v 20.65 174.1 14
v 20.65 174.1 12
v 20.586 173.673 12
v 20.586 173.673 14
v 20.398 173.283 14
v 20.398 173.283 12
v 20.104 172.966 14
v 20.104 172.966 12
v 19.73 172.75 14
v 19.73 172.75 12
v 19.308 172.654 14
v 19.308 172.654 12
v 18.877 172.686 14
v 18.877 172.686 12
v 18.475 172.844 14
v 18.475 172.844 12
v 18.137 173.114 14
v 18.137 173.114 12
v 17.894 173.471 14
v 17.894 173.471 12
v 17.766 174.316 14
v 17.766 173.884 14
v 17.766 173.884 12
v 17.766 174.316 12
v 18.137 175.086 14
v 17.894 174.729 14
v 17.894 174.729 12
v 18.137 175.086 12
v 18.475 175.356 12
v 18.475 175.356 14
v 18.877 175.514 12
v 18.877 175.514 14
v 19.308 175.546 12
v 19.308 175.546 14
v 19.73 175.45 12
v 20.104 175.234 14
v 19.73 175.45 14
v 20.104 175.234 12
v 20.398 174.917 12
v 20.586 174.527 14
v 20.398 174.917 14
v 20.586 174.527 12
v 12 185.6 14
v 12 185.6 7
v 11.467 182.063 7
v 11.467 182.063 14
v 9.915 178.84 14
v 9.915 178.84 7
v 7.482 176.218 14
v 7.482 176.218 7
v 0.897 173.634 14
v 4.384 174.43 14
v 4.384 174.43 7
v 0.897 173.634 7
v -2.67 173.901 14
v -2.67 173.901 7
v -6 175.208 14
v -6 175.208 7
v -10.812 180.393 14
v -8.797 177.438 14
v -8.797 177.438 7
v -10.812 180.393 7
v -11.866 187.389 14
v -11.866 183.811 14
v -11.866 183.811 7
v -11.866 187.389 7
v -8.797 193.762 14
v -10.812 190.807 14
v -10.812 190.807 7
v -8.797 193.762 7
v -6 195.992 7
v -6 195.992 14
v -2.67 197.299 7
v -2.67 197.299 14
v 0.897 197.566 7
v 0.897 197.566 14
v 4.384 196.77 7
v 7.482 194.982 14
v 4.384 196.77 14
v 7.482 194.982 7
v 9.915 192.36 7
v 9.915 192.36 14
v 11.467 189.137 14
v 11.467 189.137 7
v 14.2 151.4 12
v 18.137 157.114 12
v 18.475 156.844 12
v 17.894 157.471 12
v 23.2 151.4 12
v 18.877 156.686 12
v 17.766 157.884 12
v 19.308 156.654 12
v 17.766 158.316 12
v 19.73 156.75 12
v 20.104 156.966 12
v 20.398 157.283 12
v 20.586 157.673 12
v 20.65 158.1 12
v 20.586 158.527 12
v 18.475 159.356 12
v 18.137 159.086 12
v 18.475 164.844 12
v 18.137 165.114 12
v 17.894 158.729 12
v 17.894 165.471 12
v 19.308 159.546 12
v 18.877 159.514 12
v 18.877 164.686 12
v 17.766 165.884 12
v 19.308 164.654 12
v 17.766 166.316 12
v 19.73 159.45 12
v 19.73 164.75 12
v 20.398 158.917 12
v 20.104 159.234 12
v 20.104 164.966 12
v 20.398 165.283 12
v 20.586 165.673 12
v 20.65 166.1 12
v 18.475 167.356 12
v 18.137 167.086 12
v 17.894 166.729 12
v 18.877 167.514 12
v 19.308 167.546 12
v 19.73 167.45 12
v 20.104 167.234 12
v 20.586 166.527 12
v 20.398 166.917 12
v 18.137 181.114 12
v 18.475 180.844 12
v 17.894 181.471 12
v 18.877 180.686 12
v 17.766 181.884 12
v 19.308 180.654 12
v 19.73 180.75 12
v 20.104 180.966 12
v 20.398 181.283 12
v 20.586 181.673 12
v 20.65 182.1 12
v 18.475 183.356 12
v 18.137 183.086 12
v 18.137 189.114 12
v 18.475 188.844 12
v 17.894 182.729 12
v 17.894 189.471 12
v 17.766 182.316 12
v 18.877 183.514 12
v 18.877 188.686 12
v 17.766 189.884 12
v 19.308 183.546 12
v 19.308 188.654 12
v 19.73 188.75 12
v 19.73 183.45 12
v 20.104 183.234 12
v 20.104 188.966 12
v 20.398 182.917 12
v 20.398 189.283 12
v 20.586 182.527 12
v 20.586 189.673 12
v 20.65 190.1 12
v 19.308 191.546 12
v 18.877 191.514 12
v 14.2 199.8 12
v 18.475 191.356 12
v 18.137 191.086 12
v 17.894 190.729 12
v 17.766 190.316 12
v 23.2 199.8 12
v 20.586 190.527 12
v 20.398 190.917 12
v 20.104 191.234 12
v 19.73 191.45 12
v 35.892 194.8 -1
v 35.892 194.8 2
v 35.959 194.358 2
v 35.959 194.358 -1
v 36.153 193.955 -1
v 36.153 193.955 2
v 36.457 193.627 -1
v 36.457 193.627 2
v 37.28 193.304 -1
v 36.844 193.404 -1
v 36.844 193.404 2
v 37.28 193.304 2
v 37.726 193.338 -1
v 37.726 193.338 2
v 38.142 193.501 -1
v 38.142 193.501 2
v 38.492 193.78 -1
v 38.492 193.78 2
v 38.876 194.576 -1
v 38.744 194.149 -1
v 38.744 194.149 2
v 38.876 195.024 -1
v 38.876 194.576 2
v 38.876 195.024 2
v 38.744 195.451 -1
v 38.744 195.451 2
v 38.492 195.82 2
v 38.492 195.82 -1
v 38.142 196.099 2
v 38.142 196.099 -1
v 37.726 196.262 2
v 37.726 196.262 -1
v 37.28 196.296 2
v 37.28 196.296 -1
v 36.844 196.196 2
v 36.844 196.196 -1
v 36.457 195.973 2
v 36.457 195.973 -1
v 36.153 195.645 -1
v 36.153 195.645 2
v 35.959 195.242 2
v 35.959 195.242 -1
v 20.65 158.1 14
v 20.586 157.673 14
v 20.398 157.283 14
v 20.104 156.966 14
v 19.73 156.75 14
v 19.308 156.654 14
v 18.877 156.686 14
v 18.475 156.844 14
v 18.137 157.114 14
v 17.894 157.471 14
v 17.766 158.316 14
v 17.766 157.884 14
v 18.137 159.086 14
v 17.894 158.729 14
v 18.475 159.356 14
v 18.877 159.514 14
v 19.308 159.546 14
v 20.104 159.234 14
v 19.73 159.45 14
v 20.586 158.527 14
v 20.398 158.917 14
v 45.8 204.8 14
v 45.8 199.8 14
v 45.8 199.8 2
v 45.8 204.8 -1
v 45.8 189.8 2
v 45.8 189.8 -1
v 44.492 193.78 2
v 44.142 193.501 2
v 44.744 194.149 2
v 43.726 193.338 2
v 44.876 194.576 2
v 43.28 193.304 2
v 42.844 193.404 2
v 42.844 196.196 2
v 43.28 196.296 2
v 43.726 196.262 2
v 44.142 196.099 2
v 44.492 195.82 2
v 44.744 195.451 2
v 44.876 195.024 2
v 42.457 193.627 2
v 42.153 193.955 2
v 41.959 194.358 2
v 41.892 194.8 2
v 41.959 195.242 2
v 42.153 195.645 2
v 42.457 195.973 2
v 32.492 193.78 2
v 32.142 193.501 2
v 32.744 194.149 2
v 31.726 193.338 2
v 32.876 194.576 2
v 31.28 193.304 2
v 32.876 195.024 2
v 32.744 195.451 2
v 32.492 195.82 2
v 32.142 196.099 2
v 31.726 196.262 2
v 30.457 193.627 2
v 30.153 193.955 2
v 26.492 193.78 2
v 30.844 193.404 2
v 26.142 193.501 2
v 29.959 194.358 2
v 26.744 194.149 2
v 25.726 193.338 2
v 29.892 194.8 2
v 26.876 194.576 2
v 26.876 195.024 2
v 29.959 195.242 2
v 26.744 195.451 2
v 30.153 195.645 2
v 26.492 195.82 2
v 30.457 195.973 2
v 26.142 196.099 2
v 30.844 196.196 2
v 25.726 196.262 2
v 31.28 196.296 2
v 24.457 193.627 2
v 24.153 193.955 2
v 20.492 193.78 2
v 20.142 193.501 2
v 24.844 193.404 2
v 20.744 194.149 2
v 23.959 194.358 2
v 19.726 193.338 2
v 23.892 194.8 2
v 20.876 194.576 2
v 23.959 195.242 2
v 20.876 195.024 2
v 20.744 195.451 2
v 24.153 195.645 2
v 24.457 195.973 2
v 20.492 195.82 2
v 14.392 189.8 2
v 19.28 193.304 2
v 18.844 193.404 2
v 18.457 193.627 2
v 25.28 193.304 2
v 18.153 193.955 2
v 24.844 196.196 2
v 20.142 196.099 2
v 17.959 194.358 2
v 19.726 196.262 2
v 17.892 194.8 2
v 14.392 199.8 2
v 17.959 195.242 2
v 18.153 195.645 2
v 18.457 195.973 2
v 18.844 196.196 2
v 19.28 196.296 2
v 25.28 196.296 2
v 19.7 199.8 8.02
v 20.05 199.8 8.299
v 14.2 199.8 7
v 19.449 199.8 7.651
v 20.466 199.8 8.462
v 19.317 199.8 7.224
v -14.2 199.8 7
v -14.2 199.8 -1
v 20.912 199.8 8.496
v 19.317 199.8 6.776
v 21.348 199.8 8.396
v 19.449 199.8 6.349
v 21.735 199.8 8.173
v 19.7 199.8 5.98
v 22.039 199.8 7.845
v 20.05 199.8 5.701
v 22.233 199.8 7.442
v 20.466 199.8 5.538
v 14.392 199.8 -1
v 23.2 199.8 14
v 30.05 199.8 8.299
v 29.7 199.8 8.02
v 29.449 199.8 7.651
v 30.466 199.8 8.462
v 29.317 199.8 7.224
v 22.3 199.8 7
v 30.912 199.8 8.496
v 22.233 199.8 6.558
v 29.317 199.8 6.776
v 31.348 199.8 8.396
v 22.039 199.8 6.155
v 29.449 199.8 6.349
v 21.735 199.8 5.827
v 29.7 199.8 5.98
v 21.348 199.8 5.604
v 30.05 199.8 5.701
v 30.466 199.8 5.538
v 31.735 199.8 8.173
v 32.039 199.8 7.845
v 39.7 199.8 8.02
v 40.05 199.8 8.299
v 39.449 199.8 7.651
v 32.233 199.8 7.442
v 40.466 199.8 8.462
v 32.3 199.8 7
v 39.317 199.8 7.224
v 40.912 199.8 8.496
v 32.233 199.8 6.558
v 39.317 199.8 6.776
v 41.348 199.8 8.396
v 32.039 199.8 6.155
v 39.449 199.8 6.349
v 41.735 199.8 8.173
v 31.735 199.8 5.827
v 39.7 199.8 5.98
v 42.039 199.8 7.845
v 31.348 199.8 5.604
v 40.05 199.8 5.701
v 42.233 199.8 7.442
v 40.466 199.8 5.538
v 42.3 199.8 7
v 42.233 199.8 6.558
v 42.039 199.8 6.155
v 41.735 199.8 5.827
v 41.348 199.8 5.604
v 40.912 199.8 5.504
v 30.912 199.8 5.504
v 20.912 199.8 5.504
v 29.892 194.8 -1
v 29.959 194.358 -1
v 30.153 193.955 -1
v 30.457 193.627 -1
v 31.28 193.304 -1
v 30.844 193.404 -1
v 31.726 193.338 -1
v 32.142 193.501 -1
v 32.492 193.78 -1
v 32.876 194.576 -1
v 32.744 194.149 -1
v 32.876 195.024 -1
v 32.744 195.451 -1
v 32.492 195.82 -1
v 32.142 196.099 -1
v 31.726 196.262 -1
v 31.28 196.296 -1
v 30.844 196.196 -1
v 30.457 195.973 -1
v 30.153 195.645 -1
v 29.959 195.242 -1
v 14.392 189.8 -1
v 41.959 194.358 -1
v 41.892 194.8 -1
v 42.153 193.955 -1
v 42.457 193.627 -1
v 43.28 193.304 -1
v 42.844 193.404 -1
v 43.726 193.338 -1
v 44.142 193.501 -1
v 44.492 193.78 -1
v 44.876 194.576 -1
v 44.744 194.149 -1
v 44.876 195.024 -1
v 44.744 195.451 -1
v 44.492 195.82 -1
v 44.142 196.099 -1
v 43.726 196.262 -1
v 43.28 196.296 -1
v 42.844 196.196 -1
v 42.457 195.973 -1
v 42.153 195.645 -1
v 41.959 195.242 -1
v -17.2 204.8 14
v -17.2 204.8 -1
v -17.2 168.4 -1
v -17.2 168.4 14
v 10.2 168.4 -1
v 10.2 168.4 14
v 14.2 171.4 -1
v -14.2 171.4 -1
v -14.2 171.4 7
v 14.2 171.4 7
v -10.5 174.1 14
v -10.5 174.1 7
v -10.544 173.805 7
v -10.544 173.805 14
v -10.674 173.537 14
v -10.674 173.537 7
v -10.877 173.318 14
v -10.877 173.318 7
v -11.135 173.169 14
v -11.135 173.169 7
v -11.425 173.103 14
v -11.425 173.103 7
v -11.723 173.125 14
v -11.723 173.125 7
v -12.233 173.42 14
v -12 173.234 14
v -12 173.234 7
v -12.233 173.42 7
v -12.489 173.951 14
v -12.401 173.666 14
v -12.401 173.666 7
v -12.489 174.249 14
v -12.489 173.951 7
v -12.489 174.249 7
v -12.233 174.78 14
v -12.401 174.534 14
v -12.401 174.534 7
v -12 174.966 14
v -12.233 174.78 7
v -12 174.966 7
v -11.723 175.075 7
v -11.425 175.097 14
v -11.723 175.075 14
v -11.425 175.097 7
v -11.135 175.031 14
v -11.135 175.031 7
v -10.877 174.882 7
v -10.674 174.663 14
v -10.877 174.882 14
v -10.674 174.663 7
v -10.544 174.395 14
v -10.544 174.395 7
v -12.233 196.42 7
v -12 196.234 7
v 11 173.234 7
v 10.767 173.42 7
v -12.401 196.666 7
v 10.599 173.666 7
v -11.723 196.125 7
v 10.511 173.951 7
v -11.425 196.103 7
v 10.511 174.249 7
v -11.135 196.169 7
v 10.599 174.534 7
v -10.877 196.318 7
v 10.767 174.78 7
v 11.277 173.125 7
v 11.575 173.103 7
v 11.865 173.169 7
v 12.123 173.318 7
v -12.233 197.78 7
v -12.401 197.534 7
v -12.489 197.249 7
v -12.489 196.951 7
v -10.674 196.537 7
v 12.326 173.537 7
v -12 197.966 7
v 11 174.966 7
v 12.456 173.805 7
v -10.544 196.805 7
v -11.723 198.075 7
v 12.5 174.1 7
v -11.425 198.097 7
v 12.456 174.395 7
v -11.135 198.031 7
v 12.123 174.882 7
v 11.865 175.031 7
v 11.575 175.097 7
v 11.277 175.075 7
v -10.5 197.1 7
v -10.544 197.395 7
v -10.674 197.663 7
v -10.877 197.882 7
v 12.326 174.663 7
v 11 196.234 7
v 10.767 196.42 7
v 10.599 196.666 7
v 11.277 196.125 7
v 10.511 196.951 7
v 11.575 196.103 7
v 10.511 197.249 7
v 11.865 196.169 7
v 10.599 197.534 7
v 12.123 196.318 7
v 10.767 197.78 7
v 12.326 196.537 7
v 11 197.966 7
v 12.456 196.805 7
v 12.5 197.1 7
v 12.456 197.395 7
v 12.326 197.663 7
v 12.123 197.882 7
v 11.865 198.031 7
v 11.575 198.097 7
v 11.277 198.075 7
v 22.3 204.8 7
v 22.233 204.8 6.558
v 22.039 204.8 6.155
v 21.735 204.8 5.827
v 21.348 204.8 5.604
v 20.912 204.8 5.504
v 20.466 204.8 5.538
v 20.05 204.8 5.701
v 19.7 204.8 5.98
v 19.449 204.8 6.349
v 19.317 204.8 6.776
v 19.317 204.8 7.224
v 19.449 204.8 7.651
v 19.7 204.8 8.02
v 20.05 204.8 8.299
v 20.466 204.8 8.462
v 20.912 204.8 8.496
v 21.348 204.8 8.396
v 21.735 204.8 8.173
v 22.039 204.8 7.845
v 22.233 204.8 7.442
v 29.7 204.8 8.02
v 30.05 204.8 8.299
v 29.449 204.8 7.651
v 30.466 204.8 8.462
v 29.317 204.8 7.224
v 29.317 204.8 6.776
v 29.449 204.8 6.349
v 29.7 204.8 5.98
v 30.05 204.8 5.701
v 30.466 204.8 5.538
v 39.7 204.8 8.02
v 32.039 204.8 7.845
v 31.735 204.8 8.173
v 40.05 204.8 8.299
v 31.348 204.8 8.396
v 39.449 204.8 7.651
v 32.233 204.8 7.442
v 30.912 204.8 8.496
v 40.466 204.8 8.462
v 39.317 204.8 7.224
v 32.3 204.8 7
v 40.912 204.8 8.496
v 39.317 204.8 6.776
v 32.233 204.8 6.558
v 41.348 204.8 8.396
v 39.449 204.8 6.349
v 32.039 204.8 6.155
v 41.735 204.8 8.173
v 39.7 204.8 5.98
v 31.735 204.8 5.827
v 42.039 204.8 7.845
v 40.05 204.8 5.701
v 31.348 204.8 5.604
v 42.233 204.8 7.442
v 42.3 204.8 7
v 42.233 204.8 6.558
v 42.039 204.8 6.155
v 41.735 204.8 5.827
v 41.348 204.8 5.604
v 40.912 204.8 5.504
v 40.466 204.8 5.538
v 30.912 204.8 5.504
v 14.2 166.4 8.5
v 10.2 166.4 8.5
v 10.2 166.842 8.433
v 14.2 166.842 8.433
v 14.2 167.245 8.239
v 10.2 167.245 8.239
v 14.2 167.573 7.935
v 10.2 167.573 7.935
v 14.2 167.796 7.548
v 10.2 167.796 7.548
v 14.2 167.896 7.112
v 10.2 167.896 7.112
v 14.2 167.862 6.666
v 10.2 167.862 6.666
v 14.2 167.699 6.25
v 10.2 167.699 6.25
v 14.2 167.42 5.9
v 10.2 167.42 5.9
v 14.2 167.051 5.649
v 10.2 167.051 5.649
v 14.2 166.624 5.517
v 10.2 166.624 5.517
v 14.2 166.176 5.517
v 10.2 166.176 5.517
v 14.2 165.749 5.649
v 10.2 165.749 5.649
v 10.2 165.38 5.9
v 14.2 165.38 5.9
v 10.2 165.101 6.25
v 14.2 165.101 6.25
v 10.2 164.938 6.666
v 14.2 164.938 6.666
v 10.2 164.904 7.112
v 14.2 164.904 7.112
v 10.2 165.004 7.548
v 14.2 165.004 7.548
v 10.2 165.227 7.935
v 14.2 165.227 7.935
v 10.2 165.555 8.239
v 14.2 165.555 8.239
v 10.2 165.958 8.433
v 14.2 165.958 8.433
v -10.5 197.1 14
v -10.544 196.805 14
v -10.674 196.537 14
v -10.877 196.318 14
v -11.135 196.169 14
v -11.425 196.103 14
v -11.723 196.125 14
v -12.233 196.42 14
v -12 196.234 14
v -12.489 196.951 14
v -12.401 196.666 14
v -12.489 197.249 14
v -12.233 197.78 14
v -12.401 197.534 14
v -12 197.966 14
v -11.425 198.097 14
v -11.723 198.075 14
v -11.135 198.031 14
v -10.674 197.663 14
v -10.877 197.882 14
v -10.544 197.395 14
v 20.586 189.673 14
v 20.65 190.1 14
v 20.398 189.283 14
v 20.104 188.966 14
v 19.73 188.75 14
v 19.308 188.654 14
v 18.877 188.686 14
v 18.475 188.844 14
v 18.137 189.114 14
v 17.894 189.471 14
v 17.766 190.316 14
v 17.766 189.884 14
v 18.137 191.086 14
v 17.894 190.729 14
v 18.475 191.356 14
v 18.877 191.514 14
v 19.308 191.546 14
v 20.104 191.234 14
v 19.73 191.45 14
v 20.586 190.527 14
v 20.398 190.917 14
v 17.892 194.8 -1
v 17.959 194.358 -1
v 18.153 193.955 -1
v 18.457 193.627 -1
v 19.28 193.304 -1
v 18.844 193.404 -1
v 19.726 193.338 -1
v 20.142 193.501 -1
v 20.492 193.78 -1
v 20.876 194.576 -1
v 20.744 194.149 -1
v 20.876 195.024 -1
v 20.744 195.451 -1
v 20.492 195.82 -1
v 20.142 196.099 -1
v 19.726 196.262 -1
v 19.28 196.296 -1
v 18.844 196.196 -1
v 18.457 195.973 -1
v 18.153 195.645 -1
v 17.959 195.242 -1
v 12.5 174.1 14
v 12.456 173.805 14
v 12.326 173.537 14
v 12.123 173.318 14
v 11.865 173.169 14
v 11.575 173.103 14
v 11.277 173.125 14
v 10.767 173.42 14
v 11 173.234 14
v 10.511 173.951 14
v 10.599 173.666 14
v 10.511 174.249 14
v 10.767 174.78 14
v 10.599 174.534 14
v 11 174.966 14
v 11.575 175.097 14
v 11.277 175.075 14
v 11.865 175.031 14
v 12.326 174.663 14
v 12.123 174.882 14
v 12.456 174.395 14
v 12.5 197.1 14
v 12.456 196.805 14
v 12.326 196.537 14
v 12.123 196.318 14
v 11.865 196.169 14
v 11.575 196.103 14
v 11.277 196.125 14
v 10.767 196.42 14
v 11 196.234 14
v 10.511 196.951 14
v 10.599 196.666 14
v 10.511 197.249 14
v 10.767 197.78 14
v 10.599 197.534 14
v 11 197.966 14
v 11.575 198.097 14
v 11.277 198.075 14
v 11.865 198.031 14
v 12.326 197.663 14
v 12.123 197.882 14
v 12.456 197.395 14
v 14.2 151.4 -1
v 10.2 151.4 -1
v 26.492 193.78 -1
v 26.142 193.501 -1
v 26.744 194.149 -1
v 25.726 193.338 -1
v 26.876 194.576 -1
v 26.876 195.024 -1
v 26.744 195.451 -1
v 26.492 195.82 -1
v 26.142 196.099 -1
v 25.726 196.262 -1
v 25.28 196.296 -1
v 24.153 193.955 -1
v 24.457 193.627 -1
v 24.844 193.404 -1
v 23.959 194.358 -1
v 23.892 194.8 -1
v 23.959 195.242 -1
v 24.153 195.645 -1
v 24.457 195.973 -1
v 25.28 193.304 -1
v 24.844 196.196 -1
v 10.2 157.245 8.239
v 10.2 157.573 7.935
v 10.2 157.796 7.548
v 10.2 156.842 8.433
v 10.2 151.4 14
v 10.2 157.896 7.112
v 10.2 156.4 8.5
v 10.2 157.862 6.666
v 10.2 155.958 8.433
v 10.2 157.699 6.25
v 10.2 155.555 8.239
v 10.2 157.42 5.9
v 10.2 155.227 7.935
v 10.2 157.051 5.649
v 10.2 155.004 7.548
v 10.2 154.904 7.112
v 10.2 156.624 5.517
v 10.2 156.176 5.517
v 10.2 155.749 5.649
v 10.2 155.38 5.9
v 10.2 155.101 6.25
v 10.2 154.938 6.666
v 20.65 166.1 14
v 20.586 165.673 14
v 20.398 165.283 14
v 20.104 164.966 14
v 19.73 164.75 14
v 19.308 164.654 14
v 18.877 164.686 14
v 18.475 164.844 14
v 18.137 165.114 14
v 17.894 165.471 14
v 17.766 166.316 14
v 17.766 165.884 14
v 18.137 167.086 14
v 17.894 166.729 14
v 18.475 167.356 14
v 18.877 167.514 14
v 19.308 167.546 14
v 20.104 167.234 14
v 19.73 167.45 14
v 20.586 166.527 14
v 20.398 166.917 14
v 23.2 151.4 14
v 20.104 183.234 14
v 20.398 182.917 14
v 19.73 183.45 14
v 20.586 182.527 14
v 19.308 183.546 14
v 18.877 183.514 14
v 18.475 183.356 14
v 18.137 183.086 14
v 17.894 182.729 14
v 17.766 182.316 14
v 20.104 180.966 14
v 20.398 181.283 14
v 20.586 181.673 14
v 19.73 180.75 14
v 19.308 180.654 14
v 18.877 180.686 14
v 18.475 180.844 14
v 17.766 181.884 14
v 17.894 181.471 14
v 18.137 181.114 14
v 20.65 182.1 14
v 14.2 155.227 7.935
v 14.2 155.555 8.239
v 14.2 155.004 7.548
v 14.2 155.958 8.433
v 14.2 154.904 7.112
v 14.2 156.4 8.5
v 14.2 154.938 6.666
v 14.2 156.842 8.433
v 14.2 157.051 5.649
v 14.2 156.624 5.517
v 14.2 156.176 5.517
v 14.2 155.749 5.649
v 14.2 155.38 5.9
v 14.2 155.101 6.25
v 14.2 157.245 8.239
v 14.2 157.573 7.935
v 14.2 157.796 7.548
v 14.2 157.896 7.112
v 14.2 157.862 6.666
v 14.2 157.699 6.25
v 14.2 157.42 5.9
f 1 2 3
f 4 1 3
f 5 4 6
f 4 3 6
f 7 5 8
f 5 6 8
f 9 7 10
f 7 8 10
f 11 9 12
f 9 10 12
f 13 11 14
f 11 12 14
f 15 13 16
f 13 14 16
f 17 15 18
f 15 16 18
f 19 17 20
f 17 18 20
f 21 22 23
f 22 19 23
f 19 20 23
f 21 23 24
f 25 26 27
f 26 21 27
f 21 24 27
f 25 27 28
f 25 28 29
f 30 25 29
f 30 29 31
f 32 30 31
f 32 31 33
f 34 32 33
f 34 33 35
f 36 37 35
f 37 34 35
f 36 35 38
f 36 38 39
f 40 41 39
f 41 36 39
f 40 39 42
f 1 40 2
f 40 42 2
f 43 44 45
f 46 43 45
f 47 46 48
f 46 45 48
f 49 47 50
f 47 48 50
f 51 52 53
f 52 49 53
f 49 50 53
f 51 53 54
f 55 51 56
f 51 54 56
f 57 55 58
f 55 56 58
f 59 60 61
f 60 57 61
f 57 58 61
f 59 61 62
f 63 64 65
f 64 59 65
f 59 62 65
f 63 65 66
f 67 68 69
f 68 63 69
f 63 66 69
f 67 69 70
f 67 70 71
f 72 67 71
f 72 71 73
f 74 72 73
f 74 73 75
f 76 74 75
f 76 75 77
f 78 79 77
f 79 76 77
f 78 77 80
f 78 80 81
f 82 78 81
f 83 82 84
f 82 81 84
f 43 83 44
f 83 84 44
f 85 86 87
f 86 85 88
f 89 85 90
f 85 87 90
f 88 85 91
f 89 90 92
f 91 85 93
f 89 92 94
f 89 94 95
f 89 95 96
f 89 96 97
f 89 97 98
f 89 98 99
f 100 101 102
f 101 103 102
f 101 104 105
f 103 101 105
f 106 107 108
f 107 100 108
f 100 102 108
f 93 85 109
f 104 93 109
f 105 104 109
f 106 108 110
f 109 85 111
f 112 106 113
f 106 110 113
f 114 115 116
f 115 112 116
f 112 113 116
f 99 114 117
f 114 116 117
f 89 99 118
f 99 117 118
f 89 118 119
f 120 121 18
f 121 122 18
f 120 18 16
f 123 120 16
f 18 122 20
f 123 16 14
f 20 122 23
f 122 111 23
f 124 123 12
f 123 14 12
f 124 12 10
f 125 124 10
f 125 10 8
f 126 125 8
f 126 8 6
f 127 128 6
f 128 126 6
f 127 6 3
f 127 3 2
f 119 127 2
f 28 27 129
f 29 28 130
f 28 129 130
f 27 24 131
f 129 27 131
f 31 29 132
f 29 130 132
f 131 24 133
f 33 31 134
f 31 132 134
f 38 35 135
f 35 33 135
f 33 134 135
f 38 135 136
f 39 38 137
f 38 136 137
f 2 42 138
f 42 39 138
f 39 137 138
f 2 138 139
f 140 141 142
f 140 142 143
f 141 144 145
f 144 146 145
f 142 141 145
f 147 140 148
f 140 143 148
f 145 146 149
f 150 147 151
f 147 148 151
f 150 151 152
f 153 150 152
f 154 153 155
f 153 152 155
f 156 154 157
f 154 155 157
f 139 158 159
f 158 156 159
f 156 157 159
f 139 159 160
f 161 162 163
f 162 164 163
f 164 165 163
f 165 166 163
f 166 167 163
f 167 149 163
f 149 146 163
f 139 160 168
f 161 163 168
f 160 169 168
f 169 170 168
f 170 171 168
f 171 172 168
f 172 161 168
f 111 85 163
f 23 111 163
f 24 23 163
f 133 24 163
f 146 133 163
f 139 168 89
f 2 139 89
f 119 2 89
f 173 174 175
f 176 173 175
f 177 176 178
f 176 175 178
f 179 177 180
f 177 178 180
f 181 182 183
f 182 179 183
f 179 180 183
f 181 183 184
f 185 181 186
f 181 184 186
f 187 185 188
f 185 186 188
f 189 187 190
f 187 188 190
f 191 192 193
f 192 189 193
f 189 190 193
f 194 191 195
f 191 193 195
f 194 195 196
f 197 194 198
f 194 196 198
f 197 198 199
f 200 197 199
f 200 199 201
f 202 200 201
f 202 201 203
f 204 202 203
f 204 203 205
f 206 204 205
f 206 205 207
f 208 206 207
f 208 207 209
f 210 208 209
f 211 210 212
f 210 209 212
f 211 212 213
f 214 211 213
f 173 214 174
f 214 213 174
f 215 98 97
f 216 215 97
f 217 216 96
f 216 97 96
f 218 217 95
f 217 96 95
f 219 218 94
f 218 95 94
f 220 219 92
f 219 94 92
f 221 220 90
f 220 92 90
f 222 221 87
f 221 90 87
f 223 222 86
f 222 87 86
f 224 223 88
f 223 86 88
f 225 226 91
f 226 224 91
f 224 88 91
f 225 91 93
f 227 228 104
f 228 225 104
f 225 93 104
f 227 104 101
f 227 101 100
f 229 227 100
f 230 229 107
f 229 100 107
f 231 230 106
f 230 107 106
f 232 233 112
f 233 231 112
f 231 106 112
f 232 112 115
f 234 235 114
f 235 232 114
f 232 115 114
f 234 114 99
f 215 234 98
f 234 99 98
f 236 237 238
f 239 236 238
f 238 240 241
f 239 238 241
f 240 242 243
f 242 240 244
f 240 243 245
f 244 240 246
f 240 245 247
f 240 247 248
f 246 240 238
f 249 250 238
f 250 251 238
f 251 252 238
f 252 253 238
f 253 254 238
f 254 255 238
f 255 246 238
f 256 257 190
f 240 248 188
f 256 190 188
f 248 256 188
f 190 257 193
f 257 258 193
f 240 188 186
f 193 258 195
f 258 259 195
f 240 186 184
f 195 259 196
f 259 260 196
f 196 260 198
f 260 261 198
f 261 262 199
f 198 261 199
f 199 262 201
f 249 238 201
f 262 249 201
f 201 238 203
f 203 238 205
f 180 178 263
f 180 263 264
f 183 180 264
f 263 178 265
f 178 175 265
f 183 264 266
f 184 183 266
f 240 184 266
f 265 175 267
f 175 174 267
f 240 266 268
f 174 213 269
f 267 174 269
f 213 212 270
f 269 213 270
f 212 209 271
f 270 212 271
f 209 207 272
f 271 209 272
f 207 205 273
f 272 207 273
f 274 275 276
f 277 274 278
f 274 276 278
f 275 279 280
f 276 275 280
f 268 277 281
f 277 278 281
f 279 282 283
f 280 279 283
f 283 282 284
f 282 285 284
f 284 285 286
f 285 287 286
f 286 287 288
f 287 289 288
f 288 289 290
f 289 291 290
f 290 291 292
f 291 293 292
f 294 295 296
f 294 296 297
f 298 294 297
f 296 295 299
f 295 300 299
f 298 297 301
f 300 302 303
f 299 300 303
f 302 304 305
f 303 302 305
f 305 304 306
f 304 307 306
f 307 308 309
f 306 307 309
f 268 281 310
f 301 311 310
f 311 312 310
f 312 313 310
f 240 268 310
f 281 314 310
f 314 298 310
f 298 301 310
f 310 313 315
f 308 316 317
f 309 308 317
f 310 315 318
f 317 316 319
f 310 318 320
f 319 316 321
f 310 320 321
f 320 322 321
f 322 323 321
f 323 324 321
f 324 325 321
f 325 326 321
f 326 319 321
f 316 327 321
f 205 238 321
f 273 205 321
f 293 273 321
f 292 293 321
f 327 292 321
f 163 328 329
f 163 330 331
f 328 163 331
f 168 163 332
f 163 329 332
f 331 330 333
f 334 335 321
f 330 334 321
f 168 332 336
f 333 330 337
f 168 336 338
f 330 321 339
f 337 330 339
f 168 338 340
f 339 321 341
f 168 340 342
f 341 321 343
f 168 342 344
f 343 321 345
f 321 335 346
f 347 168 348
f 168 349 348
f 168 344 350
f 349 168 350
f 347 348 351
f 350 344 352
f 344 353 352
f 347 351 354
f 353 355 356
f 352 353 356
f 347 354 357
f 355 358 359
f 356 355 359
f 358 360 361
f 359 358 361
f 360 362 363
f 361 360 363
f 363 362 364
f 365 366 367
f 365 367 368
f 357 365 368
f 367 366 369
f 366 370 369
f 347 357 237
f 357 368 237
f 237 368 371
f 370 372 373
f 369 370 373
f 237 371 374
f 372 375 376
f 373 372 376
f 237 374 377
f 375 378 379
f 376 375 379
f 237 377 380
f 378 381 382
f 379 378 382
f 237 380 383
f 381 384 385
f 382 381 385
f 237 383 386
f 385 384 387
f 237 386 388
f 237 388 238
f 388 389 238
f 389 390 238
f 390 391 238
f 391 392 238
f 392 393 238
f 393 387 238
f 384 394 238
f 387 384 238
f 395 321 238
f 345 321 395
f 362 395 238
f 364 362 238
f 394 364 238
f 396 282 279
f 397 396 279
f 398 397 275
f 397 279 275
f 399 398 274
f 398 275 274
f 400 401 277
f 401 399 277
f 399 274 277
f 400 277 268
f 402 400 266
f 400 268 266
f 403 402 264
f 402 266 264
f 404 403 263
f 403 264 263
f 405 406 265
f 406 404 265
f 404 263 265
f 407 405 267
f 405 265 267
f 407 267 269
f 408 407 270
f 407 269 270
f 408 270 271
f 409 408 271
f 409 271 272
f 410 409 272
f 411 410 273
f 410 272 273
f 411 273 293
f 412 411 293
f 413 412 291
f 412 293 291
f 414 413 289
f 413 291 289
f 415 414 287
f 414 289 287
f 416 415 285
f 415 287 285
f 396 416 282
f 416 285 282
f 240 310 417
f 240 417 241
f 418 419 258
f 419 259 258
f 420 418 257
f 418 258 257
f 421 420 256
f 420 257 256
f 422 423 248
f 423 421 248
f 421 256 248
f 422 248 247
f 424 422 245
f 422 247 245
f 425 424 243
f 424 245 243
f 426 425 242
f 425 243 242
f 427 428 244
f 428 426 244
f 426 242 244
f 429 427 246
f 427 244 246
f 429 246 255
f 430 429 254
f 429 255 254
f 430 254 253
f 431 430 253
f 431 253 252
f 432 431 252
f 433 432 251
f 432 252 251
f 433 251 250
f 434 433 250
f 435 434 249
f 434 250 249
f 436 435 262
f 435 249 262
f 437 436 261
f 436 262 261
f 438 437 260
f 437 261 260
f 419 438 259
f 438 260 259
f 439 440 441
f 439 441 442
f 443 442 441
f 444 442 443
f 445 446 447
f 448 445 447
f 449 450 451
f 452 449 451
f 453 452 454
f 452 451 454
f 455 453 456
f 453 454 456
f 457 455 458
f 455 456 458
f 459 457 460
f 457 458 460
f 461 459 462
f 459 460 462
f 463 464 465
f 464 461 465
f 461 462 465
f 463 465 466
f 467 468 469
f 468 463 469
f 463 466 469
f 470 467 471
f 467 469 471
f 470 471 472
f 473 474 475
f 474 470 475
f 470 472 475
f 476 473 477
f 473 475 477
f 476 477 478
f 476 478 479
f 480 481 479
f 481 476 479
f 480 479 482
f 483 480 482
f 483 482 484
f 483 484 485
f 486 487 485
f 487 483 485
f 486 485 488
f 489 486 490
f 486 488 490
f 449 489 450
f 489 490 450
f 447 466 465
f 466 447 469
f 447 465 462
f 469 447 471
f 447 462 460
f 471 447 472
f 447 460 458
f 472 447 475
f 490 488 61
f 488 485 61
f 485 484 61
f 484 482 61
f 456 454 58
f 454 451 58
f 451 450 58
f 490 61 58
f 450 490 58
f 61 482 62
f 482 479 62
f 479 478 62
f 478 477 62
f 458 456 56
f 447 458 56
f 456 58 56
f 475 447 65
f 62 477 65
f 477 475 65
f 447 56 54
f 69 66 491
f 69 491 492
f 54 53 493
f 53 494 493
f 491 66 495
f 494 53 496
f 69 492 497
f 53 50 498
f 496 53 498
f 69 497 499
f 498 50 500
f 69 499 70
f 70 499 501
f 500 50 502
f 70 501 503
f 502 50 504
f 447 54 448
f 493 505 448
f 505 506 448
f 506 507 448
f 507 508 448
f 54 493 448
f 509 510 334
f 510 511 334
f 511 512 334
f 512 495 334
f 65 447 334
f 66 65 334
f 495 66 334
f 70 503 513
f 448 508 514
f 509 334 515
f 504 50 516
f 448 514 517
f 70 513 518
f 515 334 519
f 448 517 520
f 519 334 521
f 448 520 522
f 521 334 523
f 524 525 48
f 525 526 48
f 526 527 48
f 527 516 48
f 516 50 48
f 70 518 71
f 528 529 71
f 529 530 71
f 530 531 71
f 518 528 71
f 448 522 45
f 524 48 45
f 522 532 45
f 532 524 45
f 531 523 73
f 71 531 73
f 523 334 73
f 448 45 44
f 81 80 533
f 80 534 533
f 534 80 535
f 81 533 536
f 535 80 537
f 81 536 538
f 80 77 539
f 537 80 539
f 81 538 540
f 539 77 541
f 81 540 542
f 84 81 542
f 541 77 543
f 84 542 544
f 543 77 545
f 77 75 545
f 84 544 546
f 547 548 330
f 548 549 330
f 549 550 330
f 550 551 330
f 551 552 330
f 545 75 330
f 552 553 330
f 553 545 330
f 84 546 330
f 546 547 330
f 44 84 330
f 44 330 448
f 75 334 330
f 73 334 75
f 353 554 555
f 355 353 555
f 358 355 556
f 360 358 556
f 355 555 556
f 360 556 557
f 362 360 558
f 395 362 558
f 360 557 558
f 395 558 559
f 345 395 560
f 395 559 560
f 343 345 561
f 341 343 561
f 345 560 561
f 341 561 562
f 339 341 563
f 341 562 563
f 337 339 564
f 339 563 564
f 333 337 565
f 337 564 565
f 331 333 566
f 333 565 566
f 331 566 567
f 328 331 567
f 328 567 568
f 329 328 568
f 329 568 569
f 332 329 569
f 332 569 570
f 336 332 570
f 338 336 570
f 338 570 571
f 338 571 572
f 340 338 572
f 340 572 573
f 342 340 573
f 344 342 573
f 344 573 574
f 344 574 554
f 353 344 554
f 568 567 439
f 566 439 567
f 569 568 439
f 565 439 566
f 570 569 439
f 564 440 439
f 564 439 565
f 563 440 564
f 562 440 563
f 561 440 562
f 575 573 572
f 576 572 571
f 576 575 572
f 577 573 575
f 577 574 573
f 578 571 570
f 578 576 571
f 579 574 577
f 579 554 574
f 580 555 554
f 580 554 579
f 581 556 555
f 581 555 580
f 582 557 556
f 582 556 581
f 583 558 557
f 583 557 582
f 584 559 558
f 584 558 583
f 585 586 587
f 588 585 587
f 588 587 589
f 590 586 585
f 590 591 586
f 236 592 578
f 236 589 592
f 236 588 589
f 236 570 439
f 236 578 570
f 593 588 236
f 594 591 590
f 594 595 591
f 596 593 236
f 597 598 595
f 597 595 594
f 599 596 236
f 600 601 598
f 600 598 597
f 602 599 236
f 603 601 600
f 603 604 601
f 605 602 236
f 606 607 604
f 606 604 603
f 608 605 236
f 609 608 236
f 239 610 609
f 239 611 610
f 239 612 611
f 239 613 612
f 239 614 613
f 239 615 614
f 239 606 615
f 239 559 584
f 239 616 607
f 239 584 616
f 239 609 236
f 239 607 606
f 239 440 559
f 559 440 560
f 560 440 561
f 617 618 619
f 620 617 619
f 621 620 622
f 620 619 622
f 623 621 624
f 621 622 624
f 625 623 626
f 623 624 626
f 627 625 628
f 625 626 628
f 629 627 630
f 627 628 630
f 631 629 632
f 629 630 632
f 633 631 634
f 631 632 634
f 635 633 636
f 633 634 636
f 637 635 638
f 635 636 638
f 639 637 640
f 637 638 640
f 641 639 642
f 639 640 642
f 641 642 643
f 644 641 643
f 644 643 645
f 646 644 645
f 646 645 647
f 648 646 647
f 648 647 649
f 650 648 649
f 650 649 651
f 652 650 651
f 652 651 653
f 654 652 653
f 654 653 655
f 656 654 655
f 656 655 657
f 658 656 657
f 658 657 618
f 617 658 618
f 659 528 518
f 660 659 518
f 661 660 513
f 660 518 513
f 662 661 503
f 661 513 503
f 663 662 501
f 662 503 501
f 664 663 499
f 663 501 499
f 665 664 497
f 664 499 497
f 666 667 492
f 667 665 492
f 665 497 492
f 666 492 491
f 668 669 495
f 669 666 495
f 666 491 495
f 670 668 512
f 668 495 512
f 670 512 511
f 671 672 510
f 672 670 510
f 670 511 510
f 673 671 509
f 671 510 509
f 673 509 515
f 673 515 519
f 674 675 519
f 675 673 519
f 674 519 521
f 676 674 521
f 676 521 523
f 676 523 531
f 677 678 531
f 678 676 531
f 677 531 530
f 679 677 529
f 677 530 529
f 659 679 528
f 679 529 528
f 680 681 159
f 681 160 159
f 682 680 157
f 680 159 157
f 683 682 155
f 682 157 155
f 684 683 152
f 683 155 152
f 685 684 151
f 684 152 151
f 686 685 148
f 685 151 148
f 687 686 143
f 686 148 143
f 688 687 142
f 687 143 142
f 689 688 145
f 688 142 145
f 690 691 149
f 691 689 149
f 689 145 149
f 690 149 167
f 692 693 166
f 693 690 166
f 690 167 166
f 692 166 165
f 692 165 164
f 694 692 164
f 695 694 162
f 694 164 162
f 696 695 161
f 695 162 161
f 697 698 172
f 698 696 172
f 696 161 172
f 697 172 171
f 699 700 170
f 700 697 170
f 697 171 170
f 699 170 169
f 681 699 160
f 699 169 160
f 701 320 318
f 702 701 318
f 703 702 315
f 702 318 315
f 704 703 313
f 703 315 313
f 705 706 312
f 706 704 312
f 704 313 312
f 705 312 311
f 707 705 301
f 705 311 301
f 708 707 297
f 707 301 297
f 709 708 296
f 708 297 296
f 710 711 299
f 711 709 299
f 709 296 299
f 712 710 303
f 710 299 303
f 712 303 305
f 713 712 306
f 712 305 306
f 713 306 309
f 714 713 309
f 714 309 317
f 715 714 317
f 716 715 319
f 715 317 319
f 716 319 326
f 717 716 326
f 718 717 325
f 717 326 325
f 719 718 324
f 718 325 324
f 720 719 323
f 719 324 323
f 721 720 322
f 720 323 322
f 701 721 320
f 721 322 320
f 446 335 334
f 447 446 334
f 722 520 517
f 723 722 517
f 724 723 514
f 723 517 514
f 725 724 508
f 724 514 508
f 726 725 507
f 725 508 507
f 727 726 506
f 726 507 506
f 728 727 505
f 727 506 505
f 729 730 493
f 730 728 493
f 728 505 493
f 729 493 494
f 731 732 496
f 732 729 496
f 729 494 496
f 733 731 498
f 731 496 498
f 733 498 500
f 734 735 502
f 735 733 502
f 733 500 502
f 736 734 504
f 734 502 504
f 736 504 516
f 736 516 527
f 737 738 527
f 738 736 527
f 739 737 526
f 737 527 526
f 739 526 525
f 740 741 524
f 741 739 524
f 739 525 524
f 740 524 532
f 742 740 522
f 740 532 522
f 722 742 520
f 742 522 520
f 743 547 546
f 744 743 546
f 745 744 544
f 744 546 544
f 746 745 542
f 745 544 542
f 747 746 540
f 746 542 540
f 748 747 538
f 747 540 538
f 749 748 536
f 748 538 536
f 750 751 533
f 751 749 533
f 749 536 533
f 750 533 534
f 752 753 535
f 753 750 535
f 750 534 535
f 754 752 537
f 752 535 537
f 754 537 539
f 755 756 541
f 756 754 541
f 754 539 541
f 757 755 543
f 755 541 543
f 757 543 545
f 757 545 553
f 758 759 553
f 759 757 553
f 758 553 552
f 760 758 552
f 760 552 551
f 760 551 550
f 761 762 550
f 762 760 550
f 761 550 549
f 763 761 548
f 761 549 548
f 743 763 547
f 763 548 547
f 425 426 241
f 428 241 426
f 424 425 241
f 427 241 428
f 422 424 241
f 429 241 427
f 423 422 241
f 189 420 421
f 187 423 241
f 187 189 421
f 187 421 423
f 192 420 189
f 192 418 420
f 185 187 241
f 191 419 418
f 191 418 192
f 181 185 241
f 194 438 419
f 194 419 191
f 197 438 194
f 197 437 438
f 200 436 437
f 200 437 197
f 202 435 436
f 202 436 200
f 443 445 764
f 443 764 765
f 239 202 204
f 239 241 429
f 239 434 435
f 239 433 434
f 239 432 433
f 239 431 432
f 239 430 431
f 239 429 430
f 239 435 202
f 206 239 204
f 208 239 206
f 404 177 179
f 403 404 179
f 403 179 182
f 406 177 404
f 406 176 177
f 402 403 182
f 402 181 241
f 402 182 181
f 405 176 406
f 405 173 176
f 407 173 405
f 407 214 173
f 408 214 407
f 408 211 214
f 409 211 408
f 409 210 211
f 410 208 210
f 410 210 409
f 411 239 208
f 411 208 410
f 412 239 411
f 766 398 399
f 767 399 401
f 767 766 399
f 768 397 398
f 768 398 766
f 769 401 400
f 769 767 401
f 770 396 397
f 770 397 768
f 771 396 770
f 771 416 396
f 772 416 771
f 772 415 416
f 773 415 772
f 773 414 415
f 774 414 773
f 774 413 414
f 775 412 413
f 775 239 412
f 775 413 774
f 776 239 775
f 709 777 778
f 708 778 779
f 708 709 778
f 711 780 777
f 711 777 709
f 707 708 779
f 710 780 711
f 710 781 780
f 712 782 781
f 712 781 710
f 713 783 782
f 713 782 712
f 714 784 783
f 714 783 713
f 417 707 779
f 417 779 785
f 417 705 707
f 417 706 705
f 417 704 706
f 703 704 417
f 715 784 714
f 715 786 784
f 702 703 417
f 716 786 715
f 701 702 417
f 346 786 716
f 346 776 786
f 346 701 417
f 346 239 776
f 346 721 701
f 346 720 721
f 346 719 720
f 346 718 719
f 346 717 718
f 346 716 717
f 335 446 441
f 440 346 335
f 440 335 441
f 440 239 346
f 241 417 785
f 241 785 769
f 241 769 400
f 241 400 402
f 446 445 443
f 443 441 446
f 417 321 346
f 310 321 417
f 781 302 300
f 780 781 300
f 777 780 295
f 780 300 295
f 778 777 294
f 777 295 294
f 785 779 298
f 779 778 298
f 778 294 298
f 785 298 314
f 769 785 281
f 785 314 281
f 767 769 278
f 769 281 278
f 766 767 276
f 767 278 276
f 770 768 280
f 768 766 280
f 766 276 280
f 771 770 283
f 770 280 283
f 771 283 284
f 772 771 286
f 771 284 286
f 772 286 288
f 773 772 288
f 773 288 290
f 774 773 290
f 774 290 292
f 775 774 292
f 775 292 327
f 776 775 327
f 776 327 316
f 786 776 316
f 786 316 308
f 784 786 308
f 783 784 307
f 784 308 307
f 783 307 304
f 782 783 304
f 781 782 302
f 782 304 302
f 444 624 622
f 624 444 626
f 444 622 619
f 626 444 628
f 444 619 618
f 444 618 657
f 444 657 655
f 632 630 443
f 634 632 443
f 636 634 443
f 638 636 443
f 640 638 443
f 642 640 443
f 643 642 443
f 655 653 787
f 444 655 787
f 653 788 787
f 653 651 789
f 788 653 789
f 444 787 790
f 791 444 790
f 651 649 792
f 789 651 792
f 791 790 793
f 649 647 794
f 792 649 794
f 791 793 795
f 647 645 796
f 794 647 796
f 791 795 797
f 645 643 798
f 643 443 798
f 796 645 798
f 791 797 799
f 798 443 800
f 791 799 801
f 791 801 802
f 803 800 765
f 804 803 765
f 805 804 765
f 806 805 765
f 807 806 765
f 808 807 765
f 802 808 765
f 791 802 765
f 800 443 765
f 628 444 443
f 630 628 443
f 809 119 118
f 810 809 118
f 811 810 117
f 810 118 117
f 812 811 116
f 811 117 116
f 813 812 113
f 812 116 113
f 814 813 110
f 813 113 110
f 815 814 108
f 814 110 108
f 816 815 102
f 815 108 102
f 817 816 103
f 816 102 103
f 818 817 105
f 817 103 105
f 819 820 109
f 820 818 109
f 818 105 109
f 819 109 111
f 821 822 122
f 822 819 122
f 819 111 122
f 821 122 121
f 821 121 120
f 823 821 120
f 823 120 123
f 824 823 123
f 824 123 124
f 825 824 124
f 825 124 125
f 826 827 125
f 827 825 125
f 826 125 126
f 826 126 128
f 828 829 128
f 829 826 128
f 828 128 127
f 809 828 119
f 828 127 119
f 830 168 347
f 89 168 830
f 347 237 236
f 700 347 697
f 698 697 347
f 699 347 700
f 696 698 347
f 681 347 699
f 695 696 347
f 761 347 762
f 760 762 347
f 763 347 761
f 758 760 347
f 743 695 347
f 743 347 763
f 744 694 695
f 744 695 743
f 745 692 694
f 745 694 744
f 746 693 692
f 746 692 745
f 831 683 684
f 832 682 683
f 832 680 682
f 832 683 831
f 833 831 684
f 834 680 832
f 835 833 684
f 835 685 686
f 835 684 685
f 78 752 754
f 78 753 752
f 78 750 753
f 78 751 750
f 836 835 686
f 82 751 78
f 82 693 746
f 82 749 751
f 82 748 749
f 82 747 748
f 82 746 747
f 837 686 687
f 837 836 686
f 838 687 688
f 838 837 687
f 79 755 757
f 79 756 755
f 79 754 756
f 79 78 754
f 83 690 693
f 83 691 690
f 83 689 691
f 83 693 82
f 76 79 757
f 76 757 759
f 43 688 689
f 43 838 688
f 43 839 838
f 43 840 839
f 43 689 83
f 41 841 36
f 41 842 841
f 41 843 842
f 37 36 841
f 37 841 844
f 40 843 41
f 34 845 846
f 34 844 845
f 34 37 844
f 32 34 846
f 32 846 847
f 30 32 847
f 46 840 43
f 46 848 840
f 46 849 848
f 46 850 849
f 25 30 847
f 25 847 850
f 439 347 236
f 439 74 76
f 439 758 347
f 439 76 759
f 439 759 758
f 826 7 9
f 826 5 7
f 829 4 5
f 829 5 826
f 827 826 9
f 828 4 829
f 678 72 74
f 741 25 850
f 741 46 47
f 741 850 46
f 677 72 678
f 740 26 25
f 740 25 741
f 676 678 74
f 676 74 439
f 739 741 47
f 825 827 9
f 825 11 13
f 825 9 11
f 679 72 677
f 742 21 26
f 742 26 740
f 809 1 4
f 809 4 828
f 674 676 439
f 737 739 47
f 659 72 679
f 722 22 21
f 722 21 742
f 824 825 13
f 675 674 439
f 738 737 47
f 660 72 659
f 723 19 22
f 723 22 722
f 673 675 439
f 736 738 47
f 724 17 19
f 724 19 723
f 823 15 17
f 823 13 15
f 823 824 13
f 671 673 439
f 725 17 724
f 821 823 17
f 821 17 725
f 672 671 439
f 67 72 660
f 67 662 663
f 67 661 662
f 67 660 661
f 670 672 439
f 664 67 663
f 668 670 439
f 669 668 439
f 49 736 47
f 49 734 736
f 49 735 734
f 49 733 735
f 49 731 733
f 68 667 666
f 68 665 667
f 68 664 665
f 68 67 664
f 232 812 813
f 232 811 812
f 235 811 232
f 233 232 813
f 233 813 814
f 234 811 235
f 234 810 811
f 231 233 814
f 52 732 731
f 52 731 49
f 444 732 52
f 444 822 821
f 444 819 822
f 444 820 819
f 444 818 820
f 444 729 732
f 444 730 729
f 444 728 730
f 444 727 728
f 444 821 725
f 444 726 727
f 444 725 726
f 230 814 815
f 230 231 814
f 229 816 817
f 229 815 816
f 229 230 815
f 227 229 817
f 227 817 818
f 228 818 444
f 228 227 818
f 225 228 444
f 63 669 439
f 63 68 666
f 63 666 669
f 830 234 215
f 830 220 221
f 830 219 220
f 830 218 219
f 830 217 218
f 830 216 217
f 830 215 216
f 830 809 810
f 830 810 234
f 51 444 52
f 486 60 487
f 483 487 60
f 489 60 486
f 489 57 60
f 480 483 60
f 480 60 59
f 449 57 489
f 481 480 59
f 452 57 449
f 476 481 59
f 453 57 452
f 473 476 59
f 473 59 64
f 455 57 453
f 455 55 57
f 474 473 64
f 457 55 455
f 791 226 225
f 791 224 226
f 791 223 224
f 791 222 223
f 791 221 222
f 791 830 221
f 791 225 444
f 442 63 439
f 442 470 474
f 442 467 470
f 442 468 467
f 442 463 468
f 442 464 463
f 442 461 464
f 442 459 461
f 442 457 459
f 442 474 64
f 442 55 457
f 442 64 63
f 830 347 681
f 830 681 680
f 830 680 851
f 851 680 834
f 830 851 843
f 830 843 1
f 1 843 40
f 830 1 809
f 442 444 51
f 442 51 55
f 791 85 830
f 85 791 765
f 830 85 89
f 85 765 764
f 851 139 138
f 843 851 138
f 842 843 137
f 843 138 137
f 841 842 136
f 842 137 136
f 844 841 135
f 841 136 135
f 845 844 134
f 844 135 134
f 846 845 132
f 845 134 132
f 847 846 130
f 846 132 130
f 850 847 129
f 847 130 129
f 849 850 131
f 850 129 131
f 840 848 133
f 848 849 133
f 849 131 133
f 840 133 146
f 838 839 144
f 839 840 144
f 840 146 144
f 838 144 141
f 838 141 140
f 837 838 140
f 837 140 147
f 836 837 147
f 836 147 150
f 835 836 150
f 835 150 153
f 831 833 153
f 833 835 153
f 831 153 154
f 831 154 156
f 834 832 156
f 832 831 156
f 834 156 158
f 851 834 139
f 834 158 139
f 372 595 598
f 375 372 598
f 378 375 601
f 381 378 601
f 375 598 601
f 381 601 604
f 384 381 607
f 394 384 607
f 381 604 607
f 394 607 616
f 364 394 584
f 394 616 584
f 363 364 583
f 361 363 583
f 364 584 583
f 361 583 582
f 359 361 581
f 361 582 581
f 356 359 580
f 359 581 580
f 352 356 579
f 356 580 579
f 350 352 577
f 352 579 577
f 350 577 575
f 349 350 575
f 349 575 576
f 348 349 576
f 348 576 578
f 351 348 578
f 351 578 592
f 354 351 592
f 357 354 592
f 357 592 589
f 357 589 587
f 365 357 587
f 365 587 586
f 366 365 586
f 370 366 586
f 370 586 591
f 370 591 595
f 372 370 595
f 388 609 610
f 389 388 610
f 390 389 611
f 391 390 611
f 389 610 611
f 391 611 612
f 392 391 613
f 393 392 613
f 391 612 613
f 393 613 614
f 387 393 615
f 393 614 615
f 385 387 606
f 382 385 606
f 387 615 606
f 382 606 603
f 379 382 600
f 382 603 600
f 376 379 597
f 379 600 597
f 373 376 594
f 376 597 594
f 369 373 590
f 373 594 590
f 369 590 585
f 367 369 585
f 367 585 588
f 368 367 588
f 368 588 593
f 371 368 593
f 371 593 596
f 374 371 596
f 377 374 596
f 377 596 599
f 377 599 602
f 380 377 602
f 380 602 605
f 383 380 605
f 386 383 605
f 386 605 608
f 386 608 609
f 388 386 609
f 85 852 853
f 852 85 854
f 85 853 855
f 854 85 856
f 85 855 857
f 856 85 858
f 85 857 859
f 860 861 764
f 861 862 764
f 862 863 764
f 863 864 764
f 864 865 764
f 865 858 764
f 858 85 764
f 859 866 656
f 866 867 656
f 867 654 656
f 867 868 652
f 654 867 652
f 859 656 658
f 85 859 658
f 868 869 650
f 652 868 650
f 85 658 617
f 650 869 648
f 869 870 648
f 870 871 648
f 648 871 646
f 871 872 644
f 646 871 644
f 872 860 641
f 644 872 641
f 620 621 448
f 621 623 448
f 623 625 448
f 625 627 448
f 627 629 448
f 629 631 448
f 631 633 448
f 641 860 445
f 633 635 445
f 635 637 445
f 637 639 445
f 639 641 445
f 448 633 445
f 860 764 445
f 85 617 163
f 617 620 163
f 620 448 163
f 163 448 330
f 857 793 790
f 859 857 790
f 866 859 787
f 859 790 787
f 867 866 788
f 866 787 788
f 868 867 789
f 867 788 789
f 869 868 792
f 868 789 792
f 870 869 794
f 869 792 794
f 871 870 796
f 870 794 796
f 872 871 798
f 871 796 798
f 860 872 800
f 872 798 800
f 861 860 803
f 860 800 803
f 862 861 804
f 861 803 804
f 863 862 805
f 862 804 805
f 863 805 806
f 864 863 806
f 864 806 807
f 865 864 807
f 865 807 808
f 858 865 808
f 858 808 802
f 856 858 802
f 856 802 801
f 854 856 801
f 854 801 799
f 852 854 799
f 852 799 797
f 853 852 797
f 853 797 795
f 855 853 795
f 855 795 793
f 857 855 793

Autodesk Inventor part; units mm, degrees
ref_plane "YZ Plane" through (0, 0, 0) normal (1, 0, 0) x (0, 1, 0)
ref_plane "Work Plane1" through (0, 185.6, 7) normal (0, 0, 1) x (1, 0, 0)
sketch "Sketch1" plane through (0, 185.6, 7) normal (0, 0, 1) x (1, 0, 0)
  circle A0 centre (-11.5, -11.5) radius 1 projected
  circle A1 centre (11.5, 11.5) radius 1 projected
  circle A2 centre (11.5, -11.5) radius 1 projected
  circle A3 centre (-11.5, 11.5) radius 1 projected
  circle A4 centre (0, 0) radius 11 projected
  arc A5 (-14.2, -11.025) -> (-11.025, -14.2) centre (-11.025, -11.025) ccw projected
  line L0 (-11.025, -14.2) -> (11.025, -14.2) projected
  arc A6 (11.025, -14.2) -> (14.2, -11.025) centre (11.025, -11.025) ccw projected
  line L1 (14.2, -11.025) -> (14.2, 11.025) projected
  arc A7 (14.2, 11.025) -> (11.025, 14.2) centre (11.025, 11.025) ccw projected
  line L2 (11.025, 14.2) -> (-11.025, 14.2) projected
  arc A8 (-11.025, 14.2) -> (-14.2, 11.025) centre (-11.025, 11.025) ccw projected
  line L3 (-14.2, 11.025) -> (-14.2, -11.025) projected
  line L4 (-14.2, 14.2) -> (14.2, 14.2)
  line L5 (14.2, 14.2) -> (14.2, -14.2)
  line L6 (14.2, -14.2) -> (-14.2, -14.2)
  line L7 (-14.2, -14.2) -> (-14.2, 14.2)
  circle A9 centre (-11.5, 11.5) radius 1.6
  circle A10 centre (-11.5, -11.5) radius 1.624
  circle A11 centre (11.5, -11.5) radius 1.6374
  circle A12 centre (11.5, 11.5) radius 1.6
  line L8 (14.2, -14.2) -> (10.2, -14.2)
  line L9 (10.2, -14.2) -> (10.2, -34.2)
  line L10 (10.2, -34.2) -> (14.2, -34.2)
  line L11 (14.2, -34.2) -> (14.2, -14.2)
  circle A13 centre (0, 0) radius 12
  point P0 (0, -185.6)
  dimension "d0" = 3.2
  dimension "d3" = 4
  dimension "d4" = 20
  dimension "d25" = 1
ref_plane "Work Plane2" through (14.2, -18.2, 10) normal (0, 0, 1) x (1, 0, 0)
ref_plane "Work Plane3" through (14.2, -18.2, 8) normal (0, 0, 1) x (1, 0, 0)
extrude "Extrusion1" add sketch "Sketch1" along normal blind 5 contours L3 A8 L2 A7 L1 A6 L0 A5 | A5 L6 L7 | L7 L4 A8 | L0 L6 L11 L10 L9 | A6 L5 L6 | L4 L5 A7 | A9 | A10 | A11 | A12
sketch "Sketch2" plane through (10.2, 151.4, 7) normal (-1, 0, 0) x (0, 0, 1)
  line L0 (5, 20) -> (5, 0) projected
  line L1 (5, 0) -> (-5, 0)
  line L2 (-5, 0) -> (-5, 20)
  line L3 (-5, 20) -> (5, 20)
  line L4 (5, 20) -> (5, 0)
  point P0 (-7, -151.4)
  dimension "d30" = 10
extrude "Extrusion2" add sketch "Sketch2" against normal up to surface (4 mm away)
sketch "Sketch3" plane through (-14.2, 199.8, 12) normal (0, 0, 1) x (1, 0, 0)
  line L0 (28.4, 0) -> (37.4, 0)
  line L1 (37.4, 0) -> (37.4, -48.4)
  line L2 (37.4, -48.4) -> (28.4, -48.4)
  line L3 (28.4, -48.4) -> (28.4, 0)
  line L4 (34.9, -208) -> (31.9, -208) projected
  line L5 (34.9, -8) -> (34.9, -208) projected
  line L6 (31.9, -8) -> (34.9, -8) projected
  line L7 (31.9, -208) -> (31.9, -8) projected
  circle A0 centre (33.4, -25.7) radius 1.45
  circle A1 centre (33.4, -33.7) radius 1.45
  circle A2 centre (33.4, -41.7) radius 1.45
  circle A3 centre (33.4, -17.7) radius 1.45
  circle A4 centre (33.4, -25.7) radius 1.45
  circle A5 centre (33.4, -33.7) radius 1.45
  circle A6 centre (33.4, -9.7) radius 1.45
  circle A7 centre (33.4, -17.7) radius 1.45
  circle A8 centre (33.4, -25.7) radius 1.45
  circle A9 centre (14.2, -14.2) radius 12 projected
  circle A10 centre (25.7, -25.7) radius 1 projected
  circle A11 centre (2.7, -25.7) radius 1 projected
  circle A12 centre (25.7, -2.7) radius 1 projected
  circle A13 centre (2.7, -2.7) radius 1 projected
  circle A14 centre (14.2, -14.2) radius 12 projected
  line L8 (24.4, -48.4) -> (28.4, -48.4) projected
  line L9 (28.4, 0) -> (0, 0) projected
  line L10 (0, 0) -> (0, -28.4) projected
  line L11 (0, -28.4) -> (24.4, -28.4) projected
  line L12 (28.4, -48.4) -> (28.4, 0) projected
  line L13 (24.4, -28.4) -> (24.4, -48.4) projected
  point P0 (14.2, -199.8)
  dimension "d8" = 9
  dimension "d9" = 2.9
  dimension "d12" = 8
  dimension "d15" = 8
extrude "Extrusion3" add sketch "Sketch3" along normal blind 2 contours L0 L1 L2 L5 L6 L7 L3 | L3 L8 L13 L11 L10 L9 | L7 L6 L5 L2
sketch "Sketch4" plane through (-14.2, 199.8, 7) normal (0, 1, 0) x (1, 0, 0)
  line L0 (28.4, 0) -> (0, 0) projected
  line L1 (0, 0) -> (0, -7) projected
  line L2 (28.4, 0) -> (28.4, -5) projected
  line L3 (37.4, -7) -> (0, -7) projected
  line L4 (0, -7) -> (60, -7)
  line L5 (60, -7) -> (60, 5)
  line L6 (60, 5) -> (0, 5)
  line L7 (0, 5) -> (0, -7)
  line L8 (37.4, -7) -> (0, -7) projected
  line L9 (37.4, -5) -> (37.4, -7) projected
  line L10 (37.4, -5) -> (28.4, -5) projected
  line L11 (24.4, 5) -> (28.4, 5) projected
  point P0 (14.2, 7)
  dimension "d26" = 60
extrude "Extrusion4" add sketch "Sketch4" along normal blind 5
sketch "Sketch5" plane through (10.2, 151.4, 2) normal (-1, 0, 0) x (0, 0, 1)
  line L0 (0, 0) -> (12, 0) projected
  line L1 (12, 20) -> (12, 0) projected
  line L2 (5, 20) -> (12, 20) projected
  line L3 (0, 20) -> (5, 20) projected
  line L4 (0, 0) -> (0, 20) projected
  circle A0 centre (5, 15) radius 1.5
  circle A1 centre (5, 5) radius 1.5
  line L5 (10, 0) -> (10, 48.4) projected
  point P0 (-2, -151.4)
  dimension "d31" = 3
  dimension "d32" = 3
  dimension "d33" = 5
  dimension "d34" = 5
  dimension "d35" = 5
  dimension "d36" = 5
extrude "Extrusion5" cut sketch "Sketch5" against normal through all contours A0 | A1
sketch "Sketch6" plane through (-14.2, 171.4, 7) normal (-1, 0, 0) x (0, 0, 1)
  line L0 (0, 28.4) -> (0, 0) projected
  line L1 (0, 0) -> (7, 0) projected
  line L2 (7, 0) -> (7, 33.4) projected
  line L3 (-5, 33.4) -> (7, 33.4) projected
  line L4 (-5, 28.4) -> (-5, 33.4) projected
  line L5 (-5, 28.4) -> (0, 28.4) projected
  line L6 (7, 33.4) -> (-5, 33.4)
  line L7 (-5, 33.4) -> (-5, 0)
  line L8 (-5, 0) -> (7, 0)
  line L9 (7, 0) -> (7, 33.4)
  point P0 (-7, -171.4)
extrude "Extrusion6" add sketch "Sketch6" along normal blind 3
sketch "Sketch7" plane through (10.2, 171.4, 7) normal (0, -1, 0) x (1, 0, 0)
  line L0 (0, 0) -> (0, 7) projected
  line L1 (0, 7) -> (-27.4, 7) projected
  line L2 (-24.4, 0) -> (0, 0) projected
  line L3 (0, -5) -> (0, 0) projected
  line L4 (-27.4, 7) -> (0, 7)
  line L5 (0, 7) -> (0, -5)
  line L6 (0, -5) -> (-27.4, -5)
  line L7 (-27.4, -5) -> (-27.4, 7)
  line L8 (-27.4, -5) -> (-27.4, 7) projected
  line L9 (-24.4, -5) -> (-27.4, -5) projected
  line L10 (-24.4, -5) -> (-24.4, 0) projected
  point P0 (-10.2, -7)
extrude "Extrusion7" add sketch "Sketch7" along normal blind 3
sketch "Sketch8" plane through (-14.2, 204.8, 7) normal (0, 1, 0) x (1, 0, 0)
  line L0 (24.4, -1.5) -> (24.4, 1.5) projected
  circle A0 centre (55, 0) radius 1.5
  line L1 (60, -7) -> (60, 5) projected
  line L2 (60, 5) -> (-3, 5) projected
  circle A1 centre (45, 0) radius 1.5
  circle A2 centre (35, 0) radius 1.5
  point P0 (14.2, 7)
  point P1 (37.4, -5)
  dimension "d43" = 3
  dimension "d44" = 5
  dimension "d45" = 5
  dimension "d48" = 10
extrude "Extrusion8" cut sketch "Sketch8" against normal through all
sketch "Sketch9" plane through (45.8, 199.8, 2) normal (0, 0, -1) x (-1, 0, 0)
  line L0 (0, 0) -> (60, 0) projected
  line L1 (60, 0) -> (60, -28.4) projected
  line L2 (63, 5) -> (63, -31.4) projected
  line L3 (0, 5) -> (63, 5) projected
  line L4 (0, 0) -> (0, 5) projected
  line L5 (0, 5) -> (31.4076, 5)
  line L6 (31.4076, 5) -> (31.4076, -10)
  line L7 (31.4076, -10) -> (0, -10)
  line L8 (0, -10) -> (0, 5)
  line L9 (0, 0) -> (60, 0) projected
  circle A0 centre (26.4076, -5) radius 1.5
  circle A1 centre (20.4076, -5) radius 1.5
  circle A2 centre (14.4076, -5) radius 1.5
  circle A3 centre (8.4076, -5) radius 1.5
  circle A4 centre (2.4076, -5) radius 1.5
  line L10 (31.6, -28.4) -> (31.6, -48.4) projected
  line L11 (35.6, -48.4) -> (31.6, -48.4) projected
  line L12 (35.6, -48.4) -> (35.6, -31.4) projected
  line L13 (63, -31.4) -> (35.6, -31.4) projected
  line L14 (60, -28.4) -> (31.6, -28.4) projected
  point P0 (45.8, -199.8)
  dimension "d55" = 10
  dimension "d56" = 3
  dimension "d57" = 5
  dimension "d58" = 5
  dimension "d61" = 6
extrude "Extrusion9" add sketch "Sketch9" along normal blind 3
properties part number "30_CUBE_openXY_NEMA8mount"
